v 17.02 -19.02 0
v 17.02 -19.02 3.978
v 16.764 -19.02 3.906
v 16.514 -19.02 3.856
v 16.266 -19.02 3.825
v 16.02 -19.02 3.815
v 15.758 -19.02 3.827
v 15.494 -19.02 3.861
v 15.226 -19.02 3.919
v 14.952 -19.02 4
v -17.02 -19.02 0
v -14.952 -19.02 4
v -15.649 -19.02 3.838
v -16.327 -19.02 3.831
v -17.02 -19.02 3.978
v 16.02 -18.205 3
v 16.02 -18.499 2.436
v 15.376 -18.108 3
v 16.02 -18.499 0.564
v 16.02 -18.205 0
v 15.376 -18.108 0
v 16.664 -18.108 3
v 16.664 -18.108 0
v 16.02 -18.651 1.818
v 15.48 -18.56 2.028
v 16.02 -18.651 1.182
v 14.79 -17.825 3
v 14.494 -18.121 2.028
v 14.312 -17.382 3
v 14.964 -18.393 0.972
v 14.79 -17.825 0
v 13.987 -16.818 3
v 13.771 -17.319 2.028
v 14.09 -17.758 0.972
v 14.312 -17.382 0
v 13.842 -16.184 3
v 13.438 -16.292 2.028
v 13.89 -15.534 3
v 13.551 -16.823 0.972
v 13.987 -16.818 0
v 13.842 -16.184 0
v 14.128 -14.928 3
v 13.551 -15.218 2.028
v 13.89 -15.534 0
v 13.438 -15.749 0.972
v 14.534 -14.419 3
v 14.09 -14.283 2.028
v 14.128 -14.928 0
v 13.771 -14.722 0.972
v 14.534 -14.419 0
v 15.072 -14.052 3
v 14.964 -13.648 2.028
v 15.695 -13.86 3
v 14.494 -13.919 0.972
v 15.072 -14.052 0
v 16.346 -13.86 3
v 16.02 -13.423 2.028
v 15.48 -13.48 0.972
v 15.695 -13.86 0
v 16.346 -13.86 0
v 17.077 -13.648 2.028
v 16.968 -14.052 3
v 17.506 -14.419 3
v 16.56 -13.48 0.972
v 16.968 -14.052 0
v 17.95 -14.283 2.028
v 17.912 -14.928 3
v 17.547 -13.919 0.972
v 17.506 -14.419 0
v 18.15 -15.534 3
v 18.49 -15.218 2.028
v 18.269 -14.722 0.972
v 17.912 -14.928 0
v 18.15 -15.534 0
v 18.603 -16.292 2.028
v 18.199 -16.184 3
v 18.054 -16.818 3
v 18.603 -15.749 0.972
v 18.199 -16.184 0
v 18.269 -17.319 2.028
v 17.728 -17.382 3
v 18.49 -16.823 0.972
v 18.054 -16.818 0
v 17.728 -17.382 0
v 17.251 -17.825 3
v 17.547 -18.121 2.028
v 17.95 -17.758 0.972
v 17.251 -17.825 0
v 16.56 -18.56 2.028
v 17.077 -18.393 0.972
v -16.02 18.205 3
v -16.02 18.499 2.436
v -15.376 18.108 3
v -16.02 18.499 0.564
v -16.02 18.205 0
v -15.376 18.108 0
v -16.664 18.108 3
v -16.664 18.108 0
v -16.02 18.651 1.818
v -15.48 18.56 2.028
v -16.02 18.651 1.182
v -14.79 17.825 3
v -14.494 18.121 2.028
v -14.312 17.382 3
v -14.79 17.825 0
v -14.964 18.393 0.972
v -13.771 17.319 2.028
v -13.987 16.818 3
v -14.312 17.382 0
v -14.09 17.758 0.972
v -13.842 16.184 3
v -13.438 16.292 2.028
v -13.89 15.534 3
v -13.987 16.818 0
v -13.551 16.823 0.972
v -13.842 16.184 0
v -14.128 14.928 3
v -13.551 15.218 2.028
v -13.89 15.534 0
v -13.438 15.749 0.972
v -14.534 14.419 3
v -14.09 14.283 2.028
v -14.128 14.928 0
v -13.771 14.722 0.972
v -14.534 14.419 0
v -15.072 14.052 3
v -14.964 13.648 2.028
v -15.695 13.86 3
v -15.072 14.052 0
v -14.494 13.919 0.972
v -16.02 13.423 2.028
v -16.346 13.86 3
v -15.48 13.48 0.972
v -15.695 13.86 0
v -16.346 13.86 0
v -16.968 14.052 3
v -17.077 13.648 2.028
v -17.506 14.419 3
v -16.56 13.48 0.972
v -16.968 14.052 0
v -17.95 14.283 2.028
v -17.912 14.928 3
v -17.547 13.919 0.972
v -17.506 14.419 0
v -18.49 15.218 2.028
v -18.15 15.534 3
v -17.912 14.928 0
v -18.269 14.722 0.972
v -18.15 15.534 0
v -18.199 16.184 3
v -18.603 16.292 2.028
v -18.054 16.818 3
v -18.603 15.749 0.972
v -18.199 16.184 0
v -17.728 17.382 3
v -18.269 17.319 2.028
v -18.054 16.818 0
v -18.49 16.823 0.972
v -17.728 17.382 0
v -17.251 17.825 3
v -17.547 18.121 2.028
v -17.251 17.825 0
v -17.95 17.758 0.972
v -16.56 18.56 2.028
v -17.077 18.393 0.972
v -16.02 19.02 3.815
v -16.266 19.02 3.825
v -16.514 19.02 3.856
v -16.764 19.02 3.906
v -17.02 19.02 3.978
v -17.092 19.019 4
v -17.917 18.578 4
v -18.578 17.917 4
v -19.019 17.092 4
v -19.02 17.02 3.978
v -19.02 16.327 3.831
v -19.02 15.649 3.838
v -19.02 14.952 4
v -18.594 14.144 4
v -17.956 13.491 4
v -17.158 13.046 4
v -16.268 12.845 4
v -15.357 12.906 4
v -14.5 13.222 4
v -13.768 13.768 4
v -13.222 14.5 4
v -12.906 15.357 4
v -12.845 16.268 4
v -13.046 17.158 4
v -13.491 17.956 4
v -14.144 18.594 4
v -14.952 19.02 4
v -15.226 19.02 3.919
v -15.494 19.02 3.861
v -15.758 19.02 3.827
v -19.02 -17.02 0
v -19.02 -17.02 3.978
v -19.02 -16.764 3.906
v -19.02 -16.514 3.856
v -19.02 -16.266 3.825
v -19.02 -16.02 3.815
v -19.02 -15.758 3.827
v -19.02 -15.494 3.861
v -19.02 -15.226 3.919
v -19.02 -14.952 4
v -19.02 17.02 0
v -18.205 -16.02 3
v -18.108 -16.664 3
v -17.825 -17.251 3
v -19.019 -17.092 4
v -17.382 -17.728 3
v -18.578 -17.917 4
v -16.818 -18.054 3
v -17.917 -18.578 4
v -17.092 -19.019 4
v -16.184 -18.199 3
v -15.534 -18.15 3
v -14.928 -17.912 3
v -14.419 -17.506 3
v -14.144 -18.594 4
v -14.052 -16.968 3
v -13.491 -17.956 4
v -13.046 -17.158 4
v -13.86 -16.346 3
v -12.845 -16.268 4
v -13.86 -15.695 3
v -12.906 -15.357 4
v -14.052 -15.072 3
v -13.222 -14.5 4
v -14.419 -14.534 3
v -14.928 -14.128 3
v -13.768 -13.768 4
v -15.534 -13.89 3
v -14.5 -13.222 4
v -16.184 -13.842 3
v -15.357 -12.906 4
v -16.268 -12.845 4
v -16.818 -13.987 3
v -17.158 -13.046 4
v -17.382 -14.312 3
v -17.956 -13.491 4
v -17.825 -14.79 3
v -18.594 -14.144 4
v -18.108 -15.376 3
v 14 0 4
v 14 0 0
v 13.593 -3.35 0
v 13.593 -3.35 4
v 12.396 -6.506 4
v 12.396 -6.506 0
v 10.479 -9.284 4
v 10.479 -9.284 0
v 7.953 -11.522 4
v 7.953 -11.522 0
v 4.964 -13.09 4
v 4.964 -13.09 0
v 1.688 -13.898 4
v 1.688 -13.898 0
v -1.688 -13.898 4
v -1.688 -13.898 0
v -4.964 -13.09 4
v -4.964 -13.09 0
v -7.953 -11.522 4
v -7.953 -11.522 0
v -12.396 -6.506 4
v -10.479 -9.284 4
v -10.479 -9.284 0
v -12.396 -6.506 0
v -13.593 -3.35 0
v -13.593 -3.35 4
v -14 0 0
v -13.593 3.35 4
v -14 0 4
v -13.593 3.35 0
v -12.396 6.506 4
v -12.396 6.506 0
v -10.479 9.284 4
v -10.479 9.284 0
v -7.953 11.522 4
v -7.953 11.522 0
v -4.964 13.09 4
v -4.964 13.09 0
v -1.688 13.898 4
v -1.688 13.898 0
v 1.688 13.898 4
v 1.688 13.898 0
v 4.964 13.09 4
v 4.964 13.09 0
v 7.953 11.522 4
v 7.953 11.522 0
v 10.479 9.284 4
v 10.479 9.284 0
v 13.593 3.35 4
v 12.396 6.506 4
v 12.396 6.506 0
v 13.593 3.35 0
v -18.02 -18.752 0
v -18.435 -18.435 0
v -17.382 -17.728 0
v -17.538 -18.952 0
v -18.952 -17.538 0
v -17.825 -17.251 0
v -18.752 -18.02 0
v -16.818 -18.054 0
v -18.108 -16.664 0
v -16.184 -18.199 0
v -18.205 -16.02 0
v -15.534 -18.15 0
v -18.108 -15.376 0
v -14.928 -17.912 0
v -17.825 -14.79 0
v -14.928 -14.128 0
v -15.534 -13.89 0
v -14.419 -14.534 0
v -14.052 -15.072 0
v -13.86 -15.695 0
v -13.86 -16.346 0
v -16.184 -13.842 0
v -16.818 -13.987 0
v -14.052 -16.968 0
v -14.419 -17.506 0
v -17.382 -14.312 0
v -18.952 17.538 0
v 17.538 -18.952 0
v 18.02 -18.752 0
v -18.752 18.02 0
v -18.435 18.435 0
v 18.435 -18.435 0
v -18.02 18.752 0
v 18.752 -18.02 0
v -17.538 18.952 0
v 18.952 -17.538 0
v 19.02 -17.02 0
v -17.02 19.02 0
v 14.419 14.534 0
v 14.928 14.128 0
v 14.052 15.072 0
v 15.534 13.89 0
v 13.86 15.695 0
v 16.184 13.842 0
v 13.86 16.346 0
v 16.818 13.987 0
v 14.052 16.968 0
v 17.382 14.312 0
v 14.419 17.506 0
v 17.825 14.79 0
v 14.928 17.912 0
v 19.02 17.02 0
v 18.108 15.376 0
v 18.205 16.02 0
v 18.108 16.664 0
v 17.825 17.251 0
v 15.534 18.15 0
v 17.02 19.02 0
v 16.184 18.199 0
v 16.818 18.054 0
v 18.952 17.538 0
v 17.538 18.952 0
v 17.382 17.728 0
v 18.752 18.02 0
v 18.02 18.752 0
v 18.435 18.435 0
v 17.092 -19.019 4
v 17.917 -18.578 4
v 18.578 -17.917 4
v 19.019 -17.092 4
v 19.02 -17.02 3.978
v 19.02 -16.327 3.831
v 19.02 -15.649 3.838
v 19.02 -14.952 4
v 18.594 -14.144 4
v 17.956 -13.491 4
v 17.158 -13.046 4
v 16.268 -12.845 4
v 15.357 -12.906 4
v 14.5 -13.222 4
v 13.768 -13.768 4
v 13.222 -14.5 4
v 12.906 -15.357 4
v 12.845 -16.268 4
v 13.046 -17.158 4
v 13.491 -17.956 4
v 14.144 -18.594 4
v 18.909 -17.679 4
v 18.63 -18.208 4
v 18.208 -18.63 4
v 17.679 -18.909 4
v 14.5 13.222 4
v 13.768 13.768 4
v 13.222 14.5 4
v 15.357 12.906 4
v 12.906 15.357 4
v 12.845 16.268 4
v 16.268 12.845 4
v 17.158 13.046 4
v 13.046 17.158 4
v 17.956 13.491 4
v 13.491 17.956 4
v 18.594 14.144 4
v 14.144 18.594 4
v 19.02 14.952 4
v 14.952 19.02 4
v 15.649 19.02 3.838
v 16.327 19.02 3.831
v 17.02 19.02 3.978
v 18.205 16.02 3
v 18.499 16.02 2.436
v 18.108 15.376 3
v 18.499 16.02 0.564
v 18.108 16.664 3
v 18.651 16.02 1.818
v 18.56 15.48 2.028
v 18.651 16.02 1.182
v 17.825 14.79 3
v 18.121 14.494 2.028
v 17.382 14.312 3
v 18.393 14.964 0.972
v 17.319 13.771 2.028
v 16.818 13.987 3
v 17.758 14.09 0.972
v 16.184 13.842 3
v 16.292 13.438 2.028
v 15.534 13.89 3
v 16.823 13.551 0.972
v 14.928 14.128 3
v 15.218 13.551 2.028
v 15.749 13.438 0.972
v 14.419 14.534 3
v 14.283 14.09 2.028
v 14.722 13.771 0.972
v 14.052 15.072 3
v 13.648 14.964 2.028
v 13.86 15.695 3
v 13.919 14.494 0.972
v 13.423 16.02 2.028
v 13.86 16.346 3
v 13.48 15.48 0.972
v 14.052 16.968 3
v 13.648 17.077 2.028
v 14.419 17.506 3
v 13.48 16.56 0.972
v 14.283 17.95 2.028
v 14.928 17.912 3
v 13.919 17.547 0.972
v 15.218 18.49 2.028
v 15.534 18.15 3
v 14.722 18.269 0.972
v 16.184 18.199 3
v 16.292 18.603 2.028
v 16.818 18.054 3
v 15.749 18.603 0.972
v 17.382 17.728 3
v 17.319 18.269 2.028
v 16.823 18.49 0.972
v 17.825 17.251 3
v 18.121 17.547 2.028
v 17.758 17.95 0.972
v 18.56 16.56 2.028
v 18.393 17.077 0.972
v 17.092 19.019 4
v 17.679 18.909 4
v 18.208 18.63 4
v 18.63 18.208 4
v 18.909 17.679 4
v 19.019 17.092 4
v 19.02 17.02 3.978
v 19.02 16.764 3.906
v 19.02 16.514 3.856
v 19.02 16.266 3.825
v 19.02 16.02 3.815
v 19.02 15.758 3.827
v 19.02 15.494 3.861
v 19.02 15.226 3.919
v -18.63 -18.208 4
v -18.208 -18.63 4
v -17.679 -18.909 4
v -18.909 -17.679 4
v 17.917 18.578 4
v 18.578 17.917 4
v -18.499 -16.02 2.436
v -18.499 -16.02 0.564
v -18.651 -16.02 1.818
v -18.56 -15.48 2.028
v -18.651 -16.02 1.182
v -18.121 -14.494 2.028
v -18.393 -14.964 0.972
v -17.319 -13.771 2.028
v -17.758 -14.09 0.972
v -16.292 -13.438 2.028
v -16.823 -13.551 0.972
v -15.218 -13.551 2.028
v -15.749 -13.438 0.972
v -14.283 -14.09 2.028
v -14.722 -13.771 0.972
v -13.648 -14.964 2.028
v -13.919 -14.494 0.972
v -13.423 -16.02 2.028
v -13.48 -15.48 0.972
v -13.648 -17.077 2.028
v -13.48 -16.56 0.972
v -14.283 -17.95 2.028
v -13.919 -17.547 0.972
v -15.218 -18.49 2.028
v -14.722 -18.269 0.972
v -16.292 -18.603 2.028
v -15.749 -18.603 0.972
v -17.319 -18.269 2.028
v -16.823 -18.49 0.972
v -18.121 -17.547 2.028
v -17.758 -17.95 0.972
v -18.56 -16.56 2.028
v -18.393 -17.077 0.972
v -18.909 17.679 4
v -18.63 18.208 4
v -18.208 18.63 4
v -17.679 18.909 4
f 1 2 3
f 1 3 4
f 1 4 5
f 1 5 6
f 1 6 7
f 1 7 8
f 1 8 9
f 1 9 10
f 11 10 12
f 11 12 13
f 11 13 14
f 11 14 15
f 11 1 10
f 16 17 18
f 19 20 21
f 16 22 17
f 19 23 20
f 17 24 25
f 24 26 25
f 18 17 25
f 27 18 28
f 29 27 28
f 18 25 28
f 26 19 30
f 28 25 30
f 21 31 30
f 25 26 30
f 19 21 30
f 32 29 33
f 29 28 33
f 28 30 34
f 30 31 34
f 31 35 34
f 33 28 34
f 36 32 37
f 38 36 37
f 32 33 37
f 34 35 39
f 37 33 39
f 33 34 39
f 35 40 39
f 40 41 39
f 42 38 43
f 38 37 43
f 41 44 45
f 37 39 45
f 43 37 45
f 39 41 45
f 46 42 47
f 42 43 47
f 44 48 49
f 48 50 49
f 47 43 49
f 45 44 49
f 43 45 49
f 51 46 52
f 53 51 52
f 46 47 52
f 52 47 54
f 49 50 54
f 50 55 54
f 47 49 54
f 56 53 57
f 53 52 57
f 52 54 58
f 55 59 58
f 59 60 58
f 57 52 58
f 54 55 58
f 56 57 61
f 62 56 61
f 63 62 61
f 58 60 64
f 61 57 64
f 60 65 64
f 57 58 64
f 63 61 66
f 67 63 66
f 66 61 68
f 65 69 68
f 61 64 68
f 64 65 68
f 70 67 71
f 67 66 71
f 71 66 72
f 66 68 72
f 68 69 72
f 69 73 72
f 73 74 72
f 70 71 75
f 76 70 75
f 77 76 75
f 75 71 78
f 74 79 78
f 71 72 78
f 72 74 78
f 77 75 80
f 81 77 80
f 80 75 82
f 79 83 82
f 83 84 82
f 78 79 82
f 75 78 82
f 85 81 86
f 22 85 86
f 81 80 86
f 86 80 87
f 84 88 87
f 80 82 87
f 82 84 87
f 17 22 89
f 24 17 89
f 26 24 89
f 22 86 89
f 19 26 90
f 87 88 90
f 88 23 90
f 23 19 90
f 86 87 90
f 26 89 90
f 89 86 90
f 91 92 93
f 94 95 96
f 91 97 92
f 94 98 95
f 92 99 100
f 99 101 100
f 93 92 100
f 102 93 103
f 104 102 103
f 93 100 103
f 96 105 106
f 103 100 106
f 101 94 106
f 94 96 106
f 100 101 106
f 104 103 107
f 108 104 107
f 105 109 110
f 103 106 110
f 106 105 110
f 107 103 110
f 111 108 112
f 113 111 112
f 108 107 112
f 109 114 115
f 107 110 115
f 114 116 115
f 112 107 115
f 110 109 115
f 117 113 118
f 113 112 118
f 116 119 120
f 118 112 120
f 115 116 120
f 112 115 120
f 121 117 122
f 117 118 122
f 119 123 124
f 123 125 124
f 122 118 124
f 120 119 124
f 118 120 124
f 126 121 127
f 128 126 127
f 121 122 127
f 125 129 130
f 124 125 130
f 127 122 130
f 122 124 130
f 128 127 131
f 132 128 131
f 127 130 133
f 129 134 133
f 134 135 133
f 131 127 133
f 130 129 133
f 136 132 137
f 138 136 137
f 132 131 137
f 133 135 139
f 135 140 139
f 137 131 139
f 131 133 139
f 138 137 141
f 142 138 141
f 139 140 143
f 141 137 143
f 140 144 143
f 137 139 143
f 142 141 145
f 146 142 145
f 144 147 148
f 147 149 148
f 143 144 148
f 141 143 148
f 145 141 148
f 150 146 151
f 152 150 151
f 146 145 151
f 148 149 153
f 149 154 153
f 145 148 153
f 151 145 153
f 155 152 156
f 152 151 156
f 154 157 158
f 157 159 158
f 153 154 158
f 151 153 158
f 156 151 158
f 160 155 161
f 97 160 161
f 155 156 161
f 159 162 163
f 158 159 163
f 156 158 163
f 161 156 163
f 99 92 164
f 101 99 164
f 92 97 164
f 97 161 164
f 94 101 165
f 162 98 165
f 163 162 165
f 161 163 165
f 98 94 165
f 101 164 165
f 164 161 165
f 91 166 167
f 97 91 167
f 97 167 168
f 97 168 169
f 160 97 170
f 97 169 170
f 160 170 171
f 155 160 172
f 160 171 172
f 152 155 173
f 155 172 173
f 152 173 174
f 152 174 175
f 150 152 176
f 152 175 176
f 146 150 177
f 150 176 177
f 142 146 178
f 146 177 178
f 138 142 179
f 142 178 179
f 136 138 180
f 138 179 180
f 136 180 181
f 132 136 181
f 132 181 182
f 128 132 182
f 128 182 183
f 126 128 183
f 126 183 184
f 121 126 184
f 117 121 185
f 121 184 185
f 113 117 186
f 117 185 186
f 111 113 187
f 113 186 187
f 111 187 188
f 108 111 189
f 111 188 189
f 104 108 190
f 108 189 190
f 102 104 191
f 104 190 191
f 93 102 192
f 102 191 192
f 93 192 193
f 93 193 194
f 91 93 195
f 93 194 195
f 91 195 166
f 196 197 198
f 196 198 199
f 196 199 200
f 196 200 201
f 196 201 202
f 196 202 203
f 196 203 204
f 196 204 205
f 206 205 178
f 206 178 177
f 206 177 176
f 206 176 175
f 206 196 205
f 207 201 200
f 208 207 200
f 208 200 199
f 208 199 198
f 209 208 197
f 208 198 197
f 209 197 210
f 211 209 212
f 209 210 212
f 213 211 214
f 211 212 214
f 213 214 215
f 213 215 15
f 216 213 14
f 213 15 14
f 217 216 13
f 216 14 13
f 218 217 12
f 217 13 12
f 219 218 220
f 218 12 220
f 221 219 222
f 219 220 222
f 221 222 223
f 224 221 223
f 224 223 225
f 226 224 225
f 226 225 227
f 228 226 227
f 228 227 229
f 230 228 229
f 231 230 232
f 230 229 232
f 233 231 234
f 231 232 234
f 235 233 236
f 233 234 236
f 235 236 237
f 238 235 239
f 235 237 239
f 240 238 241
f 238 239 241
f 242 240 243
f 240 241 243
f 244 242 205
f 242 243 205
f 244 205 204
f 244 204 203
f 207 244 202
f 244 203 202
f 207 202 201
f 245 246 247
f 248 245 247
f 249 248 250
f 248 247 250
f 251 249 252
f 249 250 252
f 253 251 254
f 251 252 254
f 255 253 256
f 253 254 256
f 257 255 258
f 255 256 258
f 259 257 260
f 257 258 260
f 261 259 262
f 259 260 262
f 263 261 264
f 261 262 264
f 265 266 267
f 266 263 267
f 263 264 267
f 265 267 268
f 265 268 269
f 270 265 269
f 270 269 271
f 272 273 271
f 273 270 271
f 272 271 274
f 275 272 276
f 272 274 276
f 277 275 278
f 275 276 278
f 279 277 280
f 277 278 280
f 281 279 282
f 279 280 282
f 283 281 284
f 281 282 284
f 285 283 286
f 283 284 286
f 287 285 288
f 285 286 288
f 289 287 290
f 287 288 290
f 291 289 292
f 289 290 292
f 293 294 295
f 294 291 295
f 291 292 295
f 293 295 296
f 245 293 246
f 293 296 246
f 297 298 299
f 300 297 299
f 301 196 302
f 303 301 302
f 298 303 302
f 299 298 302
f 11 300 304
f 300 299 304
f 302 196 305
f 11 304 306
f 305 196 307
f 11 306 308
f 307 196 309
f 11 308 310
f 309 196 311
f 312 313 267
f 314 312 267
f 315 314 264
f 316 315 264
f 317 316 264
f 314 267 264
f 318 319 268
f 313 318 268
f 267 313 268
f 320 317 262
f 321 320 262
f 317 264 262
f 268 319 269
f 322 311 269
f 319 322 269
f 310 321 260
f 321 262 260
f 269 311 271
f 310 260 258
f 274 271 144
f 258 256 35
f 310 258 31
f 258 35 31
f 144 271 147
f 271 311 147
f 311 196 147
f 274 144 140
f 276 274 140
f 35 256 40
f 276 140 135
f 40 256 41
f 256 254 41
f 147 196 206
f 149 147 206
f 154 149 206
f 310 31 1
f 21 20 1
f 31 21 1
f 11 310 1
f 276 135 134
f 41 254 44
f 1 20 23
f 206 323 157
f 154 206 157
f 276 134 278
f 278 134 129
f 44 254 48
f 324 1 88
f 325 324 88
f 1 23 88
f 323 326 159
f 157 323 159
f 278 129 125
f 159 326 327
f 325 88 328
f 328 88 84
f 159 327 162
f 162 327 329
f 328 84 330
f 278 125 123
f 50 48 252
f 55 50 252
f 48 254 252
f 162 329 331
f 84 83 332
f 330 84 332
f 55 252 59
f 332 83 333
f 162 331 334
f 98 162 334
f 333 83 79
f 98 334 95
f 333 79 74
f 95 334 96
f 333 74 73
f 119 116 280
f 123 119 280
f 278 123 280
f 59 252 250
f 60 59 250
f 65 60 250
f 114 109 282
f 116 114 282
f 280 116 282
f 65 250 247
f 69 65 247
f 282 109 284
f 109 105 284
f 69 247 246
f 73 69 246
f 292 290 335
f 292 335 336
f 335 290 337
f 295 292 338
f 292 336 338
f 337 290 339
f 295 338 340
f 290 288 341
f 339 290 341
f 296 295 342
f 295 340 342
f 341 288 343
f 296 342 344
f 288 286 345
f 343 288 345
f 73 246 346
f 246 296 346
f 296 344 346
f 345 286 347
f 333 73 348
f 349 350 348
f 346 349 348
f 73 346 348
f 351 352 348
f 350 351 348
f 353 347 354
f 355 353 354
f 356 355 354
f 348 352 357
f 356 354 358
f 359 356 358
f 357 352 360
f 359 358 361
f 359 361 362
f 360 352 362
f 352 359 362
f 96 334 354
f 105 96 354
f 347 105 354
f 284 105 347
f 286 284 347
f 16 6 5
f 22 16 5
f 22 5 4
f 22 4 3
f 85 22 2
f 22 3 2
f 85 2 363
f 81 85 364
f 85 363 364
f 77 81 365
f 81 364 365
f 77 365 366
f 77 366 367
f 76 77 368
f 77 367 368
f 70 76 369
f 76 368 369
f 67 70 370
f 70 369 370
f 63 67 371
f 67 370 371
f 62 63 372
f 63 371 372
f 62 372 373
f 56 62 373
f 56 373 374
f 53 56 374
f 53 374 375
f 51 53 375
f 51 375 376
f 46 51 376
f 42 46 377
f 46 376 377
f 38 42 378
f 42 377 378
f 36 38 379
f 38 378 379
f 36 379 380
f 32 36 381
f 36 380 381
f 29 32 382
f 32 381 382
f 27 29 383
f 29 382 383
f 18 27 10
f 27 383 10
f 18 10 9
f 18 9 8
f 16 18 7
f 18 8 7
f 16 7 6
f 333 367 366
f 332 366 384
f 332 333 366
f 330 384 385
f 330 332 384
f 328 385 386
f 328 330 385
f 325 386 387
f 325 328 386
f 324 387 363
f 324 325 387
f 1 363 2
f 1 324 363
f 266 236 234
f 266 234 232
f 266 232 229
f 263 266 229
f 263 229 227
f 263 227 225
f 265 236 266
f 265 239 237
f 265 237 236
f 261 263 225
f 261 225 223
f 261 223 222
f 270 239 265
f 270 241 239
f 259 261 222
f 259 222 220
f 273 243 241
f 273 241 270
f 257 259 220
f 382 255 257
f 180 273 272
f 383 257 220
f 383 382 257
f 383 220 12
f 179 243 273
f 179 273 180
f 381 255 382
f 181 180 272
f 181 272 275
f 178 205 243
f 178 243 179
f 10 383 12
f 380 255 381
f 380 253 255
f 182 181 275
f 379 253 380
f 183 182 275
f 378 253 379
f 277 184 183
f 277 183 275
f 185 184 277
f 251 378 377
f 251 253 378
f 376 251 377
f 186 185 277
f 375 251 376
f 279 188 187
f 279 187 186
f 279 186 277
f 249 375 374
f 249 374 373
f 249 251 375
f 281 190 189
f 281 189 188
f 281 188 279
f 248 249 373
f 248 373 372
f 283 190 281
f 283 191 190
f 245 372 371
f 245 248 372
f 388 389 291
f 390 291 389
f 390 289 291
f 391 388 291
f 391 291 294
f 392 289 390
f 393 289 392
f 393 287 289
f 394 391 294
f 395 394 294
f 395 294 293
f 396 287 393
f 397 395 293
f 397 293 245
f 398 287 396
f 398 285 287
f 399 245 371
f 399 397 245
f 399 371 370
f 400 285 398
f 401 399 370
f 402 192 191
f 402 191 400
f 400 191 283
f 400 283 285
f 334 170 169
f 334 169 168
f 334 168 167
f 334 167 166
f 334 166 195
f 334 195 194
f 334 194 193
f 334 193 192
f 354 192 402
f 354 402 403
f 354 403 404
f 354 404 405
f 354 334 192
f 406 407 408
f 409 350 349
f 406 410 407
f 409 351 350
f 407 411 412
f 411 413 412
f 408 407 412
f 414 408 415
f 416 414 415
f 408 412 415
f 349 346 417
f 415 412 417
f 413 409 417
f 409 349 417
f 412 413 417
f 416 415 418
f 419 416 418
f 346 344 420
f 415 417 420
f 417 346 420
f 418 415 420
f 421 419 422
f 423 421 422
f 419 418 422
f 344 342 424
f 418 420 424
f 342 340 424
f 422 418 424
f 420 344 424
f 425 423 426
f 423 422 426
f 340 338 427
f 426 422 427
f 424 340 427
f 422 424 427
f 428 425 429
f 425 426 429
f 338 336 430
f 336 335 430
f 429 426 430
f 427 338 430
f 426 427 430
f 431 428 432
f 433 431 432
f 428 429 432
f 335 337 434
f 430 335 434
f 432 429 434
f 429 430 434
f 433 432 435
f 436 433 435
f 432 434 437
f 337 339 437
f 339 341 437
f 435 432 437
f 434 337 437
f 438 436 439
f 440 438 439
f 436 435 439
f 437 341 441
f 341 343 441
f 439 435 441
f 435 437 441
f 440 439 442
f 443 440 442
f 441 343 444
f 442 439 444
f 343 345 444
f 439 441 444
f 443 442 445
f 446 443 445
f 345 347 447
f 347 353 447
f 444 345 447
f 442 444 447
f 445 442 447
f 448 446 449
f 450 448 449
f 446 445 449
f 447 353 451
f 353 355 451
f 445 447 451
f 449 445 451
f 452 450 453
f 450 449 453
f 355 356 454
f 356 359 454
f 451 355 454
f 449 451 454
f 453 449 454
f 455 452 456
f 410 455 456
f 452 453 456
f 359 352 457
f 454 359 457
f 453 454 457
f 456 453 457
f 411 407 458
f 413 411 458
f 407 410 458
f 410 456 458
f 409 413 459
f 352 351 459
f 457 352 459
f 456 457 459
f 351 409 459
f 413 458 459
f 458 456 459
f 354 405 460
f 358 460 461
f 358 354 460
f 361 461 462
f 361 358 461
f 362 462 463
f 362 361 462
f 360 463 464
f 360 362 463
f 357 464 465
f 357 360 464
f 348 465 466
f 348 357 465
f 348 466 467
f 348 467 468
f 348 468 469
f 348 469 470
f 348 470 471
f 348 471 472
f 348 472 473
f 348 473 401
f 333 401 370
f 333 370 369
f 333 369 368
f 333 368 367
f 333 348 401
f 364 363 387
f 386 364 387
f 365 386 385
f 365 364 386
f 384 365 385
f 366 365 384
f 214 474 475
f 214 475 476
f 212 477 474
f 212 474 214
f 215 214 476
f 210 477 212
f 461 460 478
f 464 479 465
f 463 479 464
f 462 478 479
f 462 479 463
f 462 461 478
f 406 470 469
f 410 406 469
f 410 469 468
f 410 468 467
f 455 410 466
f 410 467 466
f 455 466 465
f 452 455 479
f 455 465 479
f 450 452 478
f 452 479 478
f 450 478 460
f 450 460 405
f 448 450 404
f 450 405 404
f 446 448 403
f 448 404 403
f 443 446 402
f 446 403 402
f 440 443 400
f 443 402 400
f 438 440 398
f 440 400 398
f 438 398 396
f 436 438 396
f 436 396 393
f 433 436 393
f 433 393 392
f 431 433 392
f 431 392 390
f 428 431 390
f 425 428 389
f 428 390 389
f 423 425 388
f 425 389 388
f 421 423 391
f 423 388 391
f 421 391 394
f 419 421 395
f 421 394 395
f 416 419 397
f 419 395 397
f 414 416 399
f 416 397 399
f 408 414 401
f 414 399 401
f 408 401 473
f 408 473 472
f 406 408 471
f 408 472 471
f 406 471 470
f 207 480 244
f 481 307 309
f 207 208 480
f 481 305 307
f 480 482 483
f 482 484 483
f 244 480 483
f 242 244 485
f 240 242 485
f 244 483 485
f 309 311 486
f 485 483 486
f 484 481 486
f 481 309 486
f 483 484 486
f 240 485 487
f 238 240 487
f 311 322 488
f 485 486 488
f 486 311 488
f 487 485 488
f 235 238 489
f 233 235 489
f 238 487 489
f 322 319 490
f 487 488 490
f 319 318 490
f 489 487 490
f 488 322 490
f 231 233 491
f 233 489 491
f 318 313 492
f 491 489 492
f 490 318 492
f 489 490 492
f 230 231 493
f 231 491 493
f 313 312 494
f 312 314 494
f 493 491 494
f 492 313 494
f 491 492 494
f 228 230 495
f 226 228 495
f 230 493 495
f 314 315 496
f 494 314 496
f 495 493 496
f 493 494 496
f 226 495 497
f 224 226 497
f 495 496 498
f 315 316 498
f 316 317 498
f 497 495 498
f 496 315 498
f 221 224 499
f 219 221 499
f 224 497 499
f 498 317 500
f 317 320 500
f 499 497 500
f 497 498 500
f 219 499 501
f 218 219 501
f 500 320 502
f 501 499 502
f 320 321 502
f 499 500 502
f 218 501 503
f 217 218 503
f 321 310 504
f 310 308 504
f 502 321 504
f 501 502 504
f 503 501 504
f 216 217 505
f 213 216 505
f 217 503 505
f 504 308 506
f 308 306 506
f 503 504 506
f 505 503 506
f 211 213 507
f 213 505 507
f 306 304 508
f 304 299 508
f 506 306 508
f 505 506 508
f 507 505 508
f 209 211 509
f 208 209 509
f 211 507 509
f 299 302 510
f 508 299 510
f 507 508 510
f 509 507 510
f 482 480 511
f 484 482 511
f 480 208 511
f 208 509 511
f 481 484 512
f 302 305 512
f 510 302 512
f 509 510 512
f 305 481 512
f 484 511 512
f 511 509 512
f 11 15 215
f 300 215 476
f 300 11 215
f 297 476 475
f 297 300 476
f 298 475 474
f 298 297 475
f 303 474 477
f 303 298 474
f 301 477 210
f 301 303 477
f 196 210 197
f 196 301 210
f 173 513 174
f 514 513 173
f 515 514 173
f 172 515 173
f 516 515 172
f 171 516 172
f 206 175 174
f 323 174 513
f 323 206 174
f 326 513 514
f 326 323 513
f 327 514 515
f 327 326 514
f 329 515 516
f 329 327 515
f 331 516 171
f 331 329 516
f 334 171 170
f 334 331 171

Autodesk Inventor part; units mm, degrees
ref_plane "YZ Plane" through (0, 0, 0) normal (1, 0, 0) x (0, 1, 0)
ref_plane "XZ Plane" through (0, 0, 0) normal (0, 1, 0) x (-1, 0, 0)
sketch "Sketch1" plane through (0, 0, 0) normal (0, 0, 1) x (1, 0, 0)
  circle A0 centre (16.0203, -16.0203) radius 2.75 construction
  circle A1 centre (-16.0203, 16.0203) radius 2.75 construction
  circle A2 centre (16.0203, 16.0203) radius 2.75 construction
  circle A3 centre (-16.0203, -16.0203) radius 2.75 construction
  circle A4 centre (0, 0) radius 12.5 construction
  line L0 (17.0203, -19.0203) -> (-17.0203, -19.0203)
  line L1 (-19.0203, -17.0203) -> (-19.0203, 17.0203)
  line L2 (-17.0203, 19.0203) -> (17.0203, 19.0203)
  line L3 (19.0203, 17.0203) -> (19.0203, -17.0203)
  line L4 (19.0203, -19.0203) -> (-19.0203, 19.0203) construction
  line L5 (-19.0203, -19.0203) -> (19.0203, 19.0203) construction
  arc A5 (-17.0203, 19.0203) -> (-19.0203, 17.0203) centre (-17.0203, 17.0203) ccw
  arc A6 (-19.0203, -17.0203) -> (-17.0203, -19.0203) centre (-17.0203, -17.0203) ccw
  arc A7 (17.0203, -19.0203) -> (19.0203, -17.0203) centre (17.0203, -17.0203) ccw
  arc A8 (19.0203, 17.0203) -> (17.0203, 19.0203) centre (17.0203, 17.0203) ccw
  circle A9 centre (0, 0) radius 14
  line L6 (16.9, 24.9006) -> (-16.9, 24.9006) projected
  line L7 (-16.9, 21.2821) -> (-16.9, 24.9006) projected
  line L8 (-21.2821, 16.9) -> (-16.9, 21.2821) projected
  line L9 (-24.9006, 16.9) -> (-21.2821, 16.9) projected
  line L10 (-24.9006, -16.9) -> (-24.9006, 16.9) projected
  line L11 (-21.2821, -16.9) -> (-24.9006, -16.9) projected
  line L12 (-16.9, -21.2821) -> (-21.2821, -16.9) projected
  line L13 (-16.9, -24.9006) -> (-16.9, -21.2821) projected
  line L14 (16.9, -24.9006) -> (-16.9, -24.9006) projected
  line L15 (16.9, -24.9006) -> (16.9, -21.2821) projected
  line L16 (16.9, -21.2821) -> (21.2821, -16.9) projected
  line L17 (21.2821, -16.9) -> (24.9006, -16.9) projected
  line L18 (24.9006, -16.9) -> (24.9006, -16.8) projected
  line L19 (24.9006, -16.8) -> (24.9006, 16.9) projected
  line L20 (24.9006, 16.9) -> (21.2821, 16.9) projected
  line L21 (21.2821, 16.9) -> (16.9, 21.2821) projected
  line L22 (16.9, 21.2821) -> (16.9, 24.9006) projected
  point P0 (16.8, 24.9006)
  point P1 (-16.8, 24.9006)
  point P2 (-24.9006, 16.8)
  point P3 (-24.9006, -16.8)
  point P4 (-16.8, -24.9006)
  point P5 (16.8, -24.9006)
  point P6 (24.9006, 16.8)
  dimension "d0" = 2
  dimension "d1" = 28
extrude "Extrusion1" add sketch "Sketch1" along normal blind 4 contours L0 A6 L1 A5 L2 A8 L3 A7
ref_plane "Work Plane1" through (-17.0203, 16.0203, 0) normal (0, 1, 0) x (1, 0, 0)
sketch "Sketch2" plane through (-17.0203, 16.0203, 0) normal (0, 1, 0) x (1, 0, 0)
  line L0 (3.0203, 0) -> (31.0203, 0) construction
  line L1 (0, 0) -> (-2, 0) construction
  line L2 (34.0406, 0) -> (0, 0) construction
  line L3 (36.0406, 0) -> (34.0406, 0) construction
  line L4 (34.0406, 0) -> (36.0406, 0) construction
  line L5 (0, 0) -> (34.0406, 0) construction
  line L6 (-2, 0) -> (0, 0) construction
  line L7 (31.0203, -4) -> (3.0203, -4) construction
  line L8 (-2, -4) -> (0, -4) construction
  line L9 (0, -4) -> (34.0406, -4) construction
  line L10 (34.0406, -4) -> (36.0406, -4) construction
  line L11 (36.0406, -4) -> (34.0406, -4) construction
  line L12 (34.0406, -4) -> (0, -4) construction
  line L13 (0, -4) -> (-2, -4) construction
  line L14 (33.8203, 0) -> (0.2203, 0) construction
  line L15 (33.0406, 0) -> (33.0406, -4) construction
  arc A0 (33.0406, -4.15) -> (33.0406, 1.15) centre (33.0406, -1.5) ccw
  line L16 (35.2252, -3) -> (36.2252, -4)
  line L17 (33.0406, -1.5) -> (35.6906, -1.5) construction
  line L18 (36.2252, -4) -> (33.0406, -4)
  line L19 (0, -4) -> (34.0406, -4) construction
  line L20 (33.0406, -4) -> (33.0406, 1.15)
  line L21 (36.0406, 0) -> (36.0406, -4) projected
  point P0 (17.0203, 0)
  dimension "d4" = 2.65
  dimension "d5" = 2.5
  dimension "d7" = 135
  dimension "d8" = 1.5
  dimension "d14" = 3
revolve "Revolution1" cut sketch "Sketch2" angle 360 about axis through (16.0203, 16.0203, 4) along (0, 0, -1)
pattern_circular "Circular Pattern1" count 4 over 360 about axis through (0, 0, -10) along (0, 0, 1) of "Revolution1"
properties part number "20_Cube_Insert_Sample_clamp_magnetic"
